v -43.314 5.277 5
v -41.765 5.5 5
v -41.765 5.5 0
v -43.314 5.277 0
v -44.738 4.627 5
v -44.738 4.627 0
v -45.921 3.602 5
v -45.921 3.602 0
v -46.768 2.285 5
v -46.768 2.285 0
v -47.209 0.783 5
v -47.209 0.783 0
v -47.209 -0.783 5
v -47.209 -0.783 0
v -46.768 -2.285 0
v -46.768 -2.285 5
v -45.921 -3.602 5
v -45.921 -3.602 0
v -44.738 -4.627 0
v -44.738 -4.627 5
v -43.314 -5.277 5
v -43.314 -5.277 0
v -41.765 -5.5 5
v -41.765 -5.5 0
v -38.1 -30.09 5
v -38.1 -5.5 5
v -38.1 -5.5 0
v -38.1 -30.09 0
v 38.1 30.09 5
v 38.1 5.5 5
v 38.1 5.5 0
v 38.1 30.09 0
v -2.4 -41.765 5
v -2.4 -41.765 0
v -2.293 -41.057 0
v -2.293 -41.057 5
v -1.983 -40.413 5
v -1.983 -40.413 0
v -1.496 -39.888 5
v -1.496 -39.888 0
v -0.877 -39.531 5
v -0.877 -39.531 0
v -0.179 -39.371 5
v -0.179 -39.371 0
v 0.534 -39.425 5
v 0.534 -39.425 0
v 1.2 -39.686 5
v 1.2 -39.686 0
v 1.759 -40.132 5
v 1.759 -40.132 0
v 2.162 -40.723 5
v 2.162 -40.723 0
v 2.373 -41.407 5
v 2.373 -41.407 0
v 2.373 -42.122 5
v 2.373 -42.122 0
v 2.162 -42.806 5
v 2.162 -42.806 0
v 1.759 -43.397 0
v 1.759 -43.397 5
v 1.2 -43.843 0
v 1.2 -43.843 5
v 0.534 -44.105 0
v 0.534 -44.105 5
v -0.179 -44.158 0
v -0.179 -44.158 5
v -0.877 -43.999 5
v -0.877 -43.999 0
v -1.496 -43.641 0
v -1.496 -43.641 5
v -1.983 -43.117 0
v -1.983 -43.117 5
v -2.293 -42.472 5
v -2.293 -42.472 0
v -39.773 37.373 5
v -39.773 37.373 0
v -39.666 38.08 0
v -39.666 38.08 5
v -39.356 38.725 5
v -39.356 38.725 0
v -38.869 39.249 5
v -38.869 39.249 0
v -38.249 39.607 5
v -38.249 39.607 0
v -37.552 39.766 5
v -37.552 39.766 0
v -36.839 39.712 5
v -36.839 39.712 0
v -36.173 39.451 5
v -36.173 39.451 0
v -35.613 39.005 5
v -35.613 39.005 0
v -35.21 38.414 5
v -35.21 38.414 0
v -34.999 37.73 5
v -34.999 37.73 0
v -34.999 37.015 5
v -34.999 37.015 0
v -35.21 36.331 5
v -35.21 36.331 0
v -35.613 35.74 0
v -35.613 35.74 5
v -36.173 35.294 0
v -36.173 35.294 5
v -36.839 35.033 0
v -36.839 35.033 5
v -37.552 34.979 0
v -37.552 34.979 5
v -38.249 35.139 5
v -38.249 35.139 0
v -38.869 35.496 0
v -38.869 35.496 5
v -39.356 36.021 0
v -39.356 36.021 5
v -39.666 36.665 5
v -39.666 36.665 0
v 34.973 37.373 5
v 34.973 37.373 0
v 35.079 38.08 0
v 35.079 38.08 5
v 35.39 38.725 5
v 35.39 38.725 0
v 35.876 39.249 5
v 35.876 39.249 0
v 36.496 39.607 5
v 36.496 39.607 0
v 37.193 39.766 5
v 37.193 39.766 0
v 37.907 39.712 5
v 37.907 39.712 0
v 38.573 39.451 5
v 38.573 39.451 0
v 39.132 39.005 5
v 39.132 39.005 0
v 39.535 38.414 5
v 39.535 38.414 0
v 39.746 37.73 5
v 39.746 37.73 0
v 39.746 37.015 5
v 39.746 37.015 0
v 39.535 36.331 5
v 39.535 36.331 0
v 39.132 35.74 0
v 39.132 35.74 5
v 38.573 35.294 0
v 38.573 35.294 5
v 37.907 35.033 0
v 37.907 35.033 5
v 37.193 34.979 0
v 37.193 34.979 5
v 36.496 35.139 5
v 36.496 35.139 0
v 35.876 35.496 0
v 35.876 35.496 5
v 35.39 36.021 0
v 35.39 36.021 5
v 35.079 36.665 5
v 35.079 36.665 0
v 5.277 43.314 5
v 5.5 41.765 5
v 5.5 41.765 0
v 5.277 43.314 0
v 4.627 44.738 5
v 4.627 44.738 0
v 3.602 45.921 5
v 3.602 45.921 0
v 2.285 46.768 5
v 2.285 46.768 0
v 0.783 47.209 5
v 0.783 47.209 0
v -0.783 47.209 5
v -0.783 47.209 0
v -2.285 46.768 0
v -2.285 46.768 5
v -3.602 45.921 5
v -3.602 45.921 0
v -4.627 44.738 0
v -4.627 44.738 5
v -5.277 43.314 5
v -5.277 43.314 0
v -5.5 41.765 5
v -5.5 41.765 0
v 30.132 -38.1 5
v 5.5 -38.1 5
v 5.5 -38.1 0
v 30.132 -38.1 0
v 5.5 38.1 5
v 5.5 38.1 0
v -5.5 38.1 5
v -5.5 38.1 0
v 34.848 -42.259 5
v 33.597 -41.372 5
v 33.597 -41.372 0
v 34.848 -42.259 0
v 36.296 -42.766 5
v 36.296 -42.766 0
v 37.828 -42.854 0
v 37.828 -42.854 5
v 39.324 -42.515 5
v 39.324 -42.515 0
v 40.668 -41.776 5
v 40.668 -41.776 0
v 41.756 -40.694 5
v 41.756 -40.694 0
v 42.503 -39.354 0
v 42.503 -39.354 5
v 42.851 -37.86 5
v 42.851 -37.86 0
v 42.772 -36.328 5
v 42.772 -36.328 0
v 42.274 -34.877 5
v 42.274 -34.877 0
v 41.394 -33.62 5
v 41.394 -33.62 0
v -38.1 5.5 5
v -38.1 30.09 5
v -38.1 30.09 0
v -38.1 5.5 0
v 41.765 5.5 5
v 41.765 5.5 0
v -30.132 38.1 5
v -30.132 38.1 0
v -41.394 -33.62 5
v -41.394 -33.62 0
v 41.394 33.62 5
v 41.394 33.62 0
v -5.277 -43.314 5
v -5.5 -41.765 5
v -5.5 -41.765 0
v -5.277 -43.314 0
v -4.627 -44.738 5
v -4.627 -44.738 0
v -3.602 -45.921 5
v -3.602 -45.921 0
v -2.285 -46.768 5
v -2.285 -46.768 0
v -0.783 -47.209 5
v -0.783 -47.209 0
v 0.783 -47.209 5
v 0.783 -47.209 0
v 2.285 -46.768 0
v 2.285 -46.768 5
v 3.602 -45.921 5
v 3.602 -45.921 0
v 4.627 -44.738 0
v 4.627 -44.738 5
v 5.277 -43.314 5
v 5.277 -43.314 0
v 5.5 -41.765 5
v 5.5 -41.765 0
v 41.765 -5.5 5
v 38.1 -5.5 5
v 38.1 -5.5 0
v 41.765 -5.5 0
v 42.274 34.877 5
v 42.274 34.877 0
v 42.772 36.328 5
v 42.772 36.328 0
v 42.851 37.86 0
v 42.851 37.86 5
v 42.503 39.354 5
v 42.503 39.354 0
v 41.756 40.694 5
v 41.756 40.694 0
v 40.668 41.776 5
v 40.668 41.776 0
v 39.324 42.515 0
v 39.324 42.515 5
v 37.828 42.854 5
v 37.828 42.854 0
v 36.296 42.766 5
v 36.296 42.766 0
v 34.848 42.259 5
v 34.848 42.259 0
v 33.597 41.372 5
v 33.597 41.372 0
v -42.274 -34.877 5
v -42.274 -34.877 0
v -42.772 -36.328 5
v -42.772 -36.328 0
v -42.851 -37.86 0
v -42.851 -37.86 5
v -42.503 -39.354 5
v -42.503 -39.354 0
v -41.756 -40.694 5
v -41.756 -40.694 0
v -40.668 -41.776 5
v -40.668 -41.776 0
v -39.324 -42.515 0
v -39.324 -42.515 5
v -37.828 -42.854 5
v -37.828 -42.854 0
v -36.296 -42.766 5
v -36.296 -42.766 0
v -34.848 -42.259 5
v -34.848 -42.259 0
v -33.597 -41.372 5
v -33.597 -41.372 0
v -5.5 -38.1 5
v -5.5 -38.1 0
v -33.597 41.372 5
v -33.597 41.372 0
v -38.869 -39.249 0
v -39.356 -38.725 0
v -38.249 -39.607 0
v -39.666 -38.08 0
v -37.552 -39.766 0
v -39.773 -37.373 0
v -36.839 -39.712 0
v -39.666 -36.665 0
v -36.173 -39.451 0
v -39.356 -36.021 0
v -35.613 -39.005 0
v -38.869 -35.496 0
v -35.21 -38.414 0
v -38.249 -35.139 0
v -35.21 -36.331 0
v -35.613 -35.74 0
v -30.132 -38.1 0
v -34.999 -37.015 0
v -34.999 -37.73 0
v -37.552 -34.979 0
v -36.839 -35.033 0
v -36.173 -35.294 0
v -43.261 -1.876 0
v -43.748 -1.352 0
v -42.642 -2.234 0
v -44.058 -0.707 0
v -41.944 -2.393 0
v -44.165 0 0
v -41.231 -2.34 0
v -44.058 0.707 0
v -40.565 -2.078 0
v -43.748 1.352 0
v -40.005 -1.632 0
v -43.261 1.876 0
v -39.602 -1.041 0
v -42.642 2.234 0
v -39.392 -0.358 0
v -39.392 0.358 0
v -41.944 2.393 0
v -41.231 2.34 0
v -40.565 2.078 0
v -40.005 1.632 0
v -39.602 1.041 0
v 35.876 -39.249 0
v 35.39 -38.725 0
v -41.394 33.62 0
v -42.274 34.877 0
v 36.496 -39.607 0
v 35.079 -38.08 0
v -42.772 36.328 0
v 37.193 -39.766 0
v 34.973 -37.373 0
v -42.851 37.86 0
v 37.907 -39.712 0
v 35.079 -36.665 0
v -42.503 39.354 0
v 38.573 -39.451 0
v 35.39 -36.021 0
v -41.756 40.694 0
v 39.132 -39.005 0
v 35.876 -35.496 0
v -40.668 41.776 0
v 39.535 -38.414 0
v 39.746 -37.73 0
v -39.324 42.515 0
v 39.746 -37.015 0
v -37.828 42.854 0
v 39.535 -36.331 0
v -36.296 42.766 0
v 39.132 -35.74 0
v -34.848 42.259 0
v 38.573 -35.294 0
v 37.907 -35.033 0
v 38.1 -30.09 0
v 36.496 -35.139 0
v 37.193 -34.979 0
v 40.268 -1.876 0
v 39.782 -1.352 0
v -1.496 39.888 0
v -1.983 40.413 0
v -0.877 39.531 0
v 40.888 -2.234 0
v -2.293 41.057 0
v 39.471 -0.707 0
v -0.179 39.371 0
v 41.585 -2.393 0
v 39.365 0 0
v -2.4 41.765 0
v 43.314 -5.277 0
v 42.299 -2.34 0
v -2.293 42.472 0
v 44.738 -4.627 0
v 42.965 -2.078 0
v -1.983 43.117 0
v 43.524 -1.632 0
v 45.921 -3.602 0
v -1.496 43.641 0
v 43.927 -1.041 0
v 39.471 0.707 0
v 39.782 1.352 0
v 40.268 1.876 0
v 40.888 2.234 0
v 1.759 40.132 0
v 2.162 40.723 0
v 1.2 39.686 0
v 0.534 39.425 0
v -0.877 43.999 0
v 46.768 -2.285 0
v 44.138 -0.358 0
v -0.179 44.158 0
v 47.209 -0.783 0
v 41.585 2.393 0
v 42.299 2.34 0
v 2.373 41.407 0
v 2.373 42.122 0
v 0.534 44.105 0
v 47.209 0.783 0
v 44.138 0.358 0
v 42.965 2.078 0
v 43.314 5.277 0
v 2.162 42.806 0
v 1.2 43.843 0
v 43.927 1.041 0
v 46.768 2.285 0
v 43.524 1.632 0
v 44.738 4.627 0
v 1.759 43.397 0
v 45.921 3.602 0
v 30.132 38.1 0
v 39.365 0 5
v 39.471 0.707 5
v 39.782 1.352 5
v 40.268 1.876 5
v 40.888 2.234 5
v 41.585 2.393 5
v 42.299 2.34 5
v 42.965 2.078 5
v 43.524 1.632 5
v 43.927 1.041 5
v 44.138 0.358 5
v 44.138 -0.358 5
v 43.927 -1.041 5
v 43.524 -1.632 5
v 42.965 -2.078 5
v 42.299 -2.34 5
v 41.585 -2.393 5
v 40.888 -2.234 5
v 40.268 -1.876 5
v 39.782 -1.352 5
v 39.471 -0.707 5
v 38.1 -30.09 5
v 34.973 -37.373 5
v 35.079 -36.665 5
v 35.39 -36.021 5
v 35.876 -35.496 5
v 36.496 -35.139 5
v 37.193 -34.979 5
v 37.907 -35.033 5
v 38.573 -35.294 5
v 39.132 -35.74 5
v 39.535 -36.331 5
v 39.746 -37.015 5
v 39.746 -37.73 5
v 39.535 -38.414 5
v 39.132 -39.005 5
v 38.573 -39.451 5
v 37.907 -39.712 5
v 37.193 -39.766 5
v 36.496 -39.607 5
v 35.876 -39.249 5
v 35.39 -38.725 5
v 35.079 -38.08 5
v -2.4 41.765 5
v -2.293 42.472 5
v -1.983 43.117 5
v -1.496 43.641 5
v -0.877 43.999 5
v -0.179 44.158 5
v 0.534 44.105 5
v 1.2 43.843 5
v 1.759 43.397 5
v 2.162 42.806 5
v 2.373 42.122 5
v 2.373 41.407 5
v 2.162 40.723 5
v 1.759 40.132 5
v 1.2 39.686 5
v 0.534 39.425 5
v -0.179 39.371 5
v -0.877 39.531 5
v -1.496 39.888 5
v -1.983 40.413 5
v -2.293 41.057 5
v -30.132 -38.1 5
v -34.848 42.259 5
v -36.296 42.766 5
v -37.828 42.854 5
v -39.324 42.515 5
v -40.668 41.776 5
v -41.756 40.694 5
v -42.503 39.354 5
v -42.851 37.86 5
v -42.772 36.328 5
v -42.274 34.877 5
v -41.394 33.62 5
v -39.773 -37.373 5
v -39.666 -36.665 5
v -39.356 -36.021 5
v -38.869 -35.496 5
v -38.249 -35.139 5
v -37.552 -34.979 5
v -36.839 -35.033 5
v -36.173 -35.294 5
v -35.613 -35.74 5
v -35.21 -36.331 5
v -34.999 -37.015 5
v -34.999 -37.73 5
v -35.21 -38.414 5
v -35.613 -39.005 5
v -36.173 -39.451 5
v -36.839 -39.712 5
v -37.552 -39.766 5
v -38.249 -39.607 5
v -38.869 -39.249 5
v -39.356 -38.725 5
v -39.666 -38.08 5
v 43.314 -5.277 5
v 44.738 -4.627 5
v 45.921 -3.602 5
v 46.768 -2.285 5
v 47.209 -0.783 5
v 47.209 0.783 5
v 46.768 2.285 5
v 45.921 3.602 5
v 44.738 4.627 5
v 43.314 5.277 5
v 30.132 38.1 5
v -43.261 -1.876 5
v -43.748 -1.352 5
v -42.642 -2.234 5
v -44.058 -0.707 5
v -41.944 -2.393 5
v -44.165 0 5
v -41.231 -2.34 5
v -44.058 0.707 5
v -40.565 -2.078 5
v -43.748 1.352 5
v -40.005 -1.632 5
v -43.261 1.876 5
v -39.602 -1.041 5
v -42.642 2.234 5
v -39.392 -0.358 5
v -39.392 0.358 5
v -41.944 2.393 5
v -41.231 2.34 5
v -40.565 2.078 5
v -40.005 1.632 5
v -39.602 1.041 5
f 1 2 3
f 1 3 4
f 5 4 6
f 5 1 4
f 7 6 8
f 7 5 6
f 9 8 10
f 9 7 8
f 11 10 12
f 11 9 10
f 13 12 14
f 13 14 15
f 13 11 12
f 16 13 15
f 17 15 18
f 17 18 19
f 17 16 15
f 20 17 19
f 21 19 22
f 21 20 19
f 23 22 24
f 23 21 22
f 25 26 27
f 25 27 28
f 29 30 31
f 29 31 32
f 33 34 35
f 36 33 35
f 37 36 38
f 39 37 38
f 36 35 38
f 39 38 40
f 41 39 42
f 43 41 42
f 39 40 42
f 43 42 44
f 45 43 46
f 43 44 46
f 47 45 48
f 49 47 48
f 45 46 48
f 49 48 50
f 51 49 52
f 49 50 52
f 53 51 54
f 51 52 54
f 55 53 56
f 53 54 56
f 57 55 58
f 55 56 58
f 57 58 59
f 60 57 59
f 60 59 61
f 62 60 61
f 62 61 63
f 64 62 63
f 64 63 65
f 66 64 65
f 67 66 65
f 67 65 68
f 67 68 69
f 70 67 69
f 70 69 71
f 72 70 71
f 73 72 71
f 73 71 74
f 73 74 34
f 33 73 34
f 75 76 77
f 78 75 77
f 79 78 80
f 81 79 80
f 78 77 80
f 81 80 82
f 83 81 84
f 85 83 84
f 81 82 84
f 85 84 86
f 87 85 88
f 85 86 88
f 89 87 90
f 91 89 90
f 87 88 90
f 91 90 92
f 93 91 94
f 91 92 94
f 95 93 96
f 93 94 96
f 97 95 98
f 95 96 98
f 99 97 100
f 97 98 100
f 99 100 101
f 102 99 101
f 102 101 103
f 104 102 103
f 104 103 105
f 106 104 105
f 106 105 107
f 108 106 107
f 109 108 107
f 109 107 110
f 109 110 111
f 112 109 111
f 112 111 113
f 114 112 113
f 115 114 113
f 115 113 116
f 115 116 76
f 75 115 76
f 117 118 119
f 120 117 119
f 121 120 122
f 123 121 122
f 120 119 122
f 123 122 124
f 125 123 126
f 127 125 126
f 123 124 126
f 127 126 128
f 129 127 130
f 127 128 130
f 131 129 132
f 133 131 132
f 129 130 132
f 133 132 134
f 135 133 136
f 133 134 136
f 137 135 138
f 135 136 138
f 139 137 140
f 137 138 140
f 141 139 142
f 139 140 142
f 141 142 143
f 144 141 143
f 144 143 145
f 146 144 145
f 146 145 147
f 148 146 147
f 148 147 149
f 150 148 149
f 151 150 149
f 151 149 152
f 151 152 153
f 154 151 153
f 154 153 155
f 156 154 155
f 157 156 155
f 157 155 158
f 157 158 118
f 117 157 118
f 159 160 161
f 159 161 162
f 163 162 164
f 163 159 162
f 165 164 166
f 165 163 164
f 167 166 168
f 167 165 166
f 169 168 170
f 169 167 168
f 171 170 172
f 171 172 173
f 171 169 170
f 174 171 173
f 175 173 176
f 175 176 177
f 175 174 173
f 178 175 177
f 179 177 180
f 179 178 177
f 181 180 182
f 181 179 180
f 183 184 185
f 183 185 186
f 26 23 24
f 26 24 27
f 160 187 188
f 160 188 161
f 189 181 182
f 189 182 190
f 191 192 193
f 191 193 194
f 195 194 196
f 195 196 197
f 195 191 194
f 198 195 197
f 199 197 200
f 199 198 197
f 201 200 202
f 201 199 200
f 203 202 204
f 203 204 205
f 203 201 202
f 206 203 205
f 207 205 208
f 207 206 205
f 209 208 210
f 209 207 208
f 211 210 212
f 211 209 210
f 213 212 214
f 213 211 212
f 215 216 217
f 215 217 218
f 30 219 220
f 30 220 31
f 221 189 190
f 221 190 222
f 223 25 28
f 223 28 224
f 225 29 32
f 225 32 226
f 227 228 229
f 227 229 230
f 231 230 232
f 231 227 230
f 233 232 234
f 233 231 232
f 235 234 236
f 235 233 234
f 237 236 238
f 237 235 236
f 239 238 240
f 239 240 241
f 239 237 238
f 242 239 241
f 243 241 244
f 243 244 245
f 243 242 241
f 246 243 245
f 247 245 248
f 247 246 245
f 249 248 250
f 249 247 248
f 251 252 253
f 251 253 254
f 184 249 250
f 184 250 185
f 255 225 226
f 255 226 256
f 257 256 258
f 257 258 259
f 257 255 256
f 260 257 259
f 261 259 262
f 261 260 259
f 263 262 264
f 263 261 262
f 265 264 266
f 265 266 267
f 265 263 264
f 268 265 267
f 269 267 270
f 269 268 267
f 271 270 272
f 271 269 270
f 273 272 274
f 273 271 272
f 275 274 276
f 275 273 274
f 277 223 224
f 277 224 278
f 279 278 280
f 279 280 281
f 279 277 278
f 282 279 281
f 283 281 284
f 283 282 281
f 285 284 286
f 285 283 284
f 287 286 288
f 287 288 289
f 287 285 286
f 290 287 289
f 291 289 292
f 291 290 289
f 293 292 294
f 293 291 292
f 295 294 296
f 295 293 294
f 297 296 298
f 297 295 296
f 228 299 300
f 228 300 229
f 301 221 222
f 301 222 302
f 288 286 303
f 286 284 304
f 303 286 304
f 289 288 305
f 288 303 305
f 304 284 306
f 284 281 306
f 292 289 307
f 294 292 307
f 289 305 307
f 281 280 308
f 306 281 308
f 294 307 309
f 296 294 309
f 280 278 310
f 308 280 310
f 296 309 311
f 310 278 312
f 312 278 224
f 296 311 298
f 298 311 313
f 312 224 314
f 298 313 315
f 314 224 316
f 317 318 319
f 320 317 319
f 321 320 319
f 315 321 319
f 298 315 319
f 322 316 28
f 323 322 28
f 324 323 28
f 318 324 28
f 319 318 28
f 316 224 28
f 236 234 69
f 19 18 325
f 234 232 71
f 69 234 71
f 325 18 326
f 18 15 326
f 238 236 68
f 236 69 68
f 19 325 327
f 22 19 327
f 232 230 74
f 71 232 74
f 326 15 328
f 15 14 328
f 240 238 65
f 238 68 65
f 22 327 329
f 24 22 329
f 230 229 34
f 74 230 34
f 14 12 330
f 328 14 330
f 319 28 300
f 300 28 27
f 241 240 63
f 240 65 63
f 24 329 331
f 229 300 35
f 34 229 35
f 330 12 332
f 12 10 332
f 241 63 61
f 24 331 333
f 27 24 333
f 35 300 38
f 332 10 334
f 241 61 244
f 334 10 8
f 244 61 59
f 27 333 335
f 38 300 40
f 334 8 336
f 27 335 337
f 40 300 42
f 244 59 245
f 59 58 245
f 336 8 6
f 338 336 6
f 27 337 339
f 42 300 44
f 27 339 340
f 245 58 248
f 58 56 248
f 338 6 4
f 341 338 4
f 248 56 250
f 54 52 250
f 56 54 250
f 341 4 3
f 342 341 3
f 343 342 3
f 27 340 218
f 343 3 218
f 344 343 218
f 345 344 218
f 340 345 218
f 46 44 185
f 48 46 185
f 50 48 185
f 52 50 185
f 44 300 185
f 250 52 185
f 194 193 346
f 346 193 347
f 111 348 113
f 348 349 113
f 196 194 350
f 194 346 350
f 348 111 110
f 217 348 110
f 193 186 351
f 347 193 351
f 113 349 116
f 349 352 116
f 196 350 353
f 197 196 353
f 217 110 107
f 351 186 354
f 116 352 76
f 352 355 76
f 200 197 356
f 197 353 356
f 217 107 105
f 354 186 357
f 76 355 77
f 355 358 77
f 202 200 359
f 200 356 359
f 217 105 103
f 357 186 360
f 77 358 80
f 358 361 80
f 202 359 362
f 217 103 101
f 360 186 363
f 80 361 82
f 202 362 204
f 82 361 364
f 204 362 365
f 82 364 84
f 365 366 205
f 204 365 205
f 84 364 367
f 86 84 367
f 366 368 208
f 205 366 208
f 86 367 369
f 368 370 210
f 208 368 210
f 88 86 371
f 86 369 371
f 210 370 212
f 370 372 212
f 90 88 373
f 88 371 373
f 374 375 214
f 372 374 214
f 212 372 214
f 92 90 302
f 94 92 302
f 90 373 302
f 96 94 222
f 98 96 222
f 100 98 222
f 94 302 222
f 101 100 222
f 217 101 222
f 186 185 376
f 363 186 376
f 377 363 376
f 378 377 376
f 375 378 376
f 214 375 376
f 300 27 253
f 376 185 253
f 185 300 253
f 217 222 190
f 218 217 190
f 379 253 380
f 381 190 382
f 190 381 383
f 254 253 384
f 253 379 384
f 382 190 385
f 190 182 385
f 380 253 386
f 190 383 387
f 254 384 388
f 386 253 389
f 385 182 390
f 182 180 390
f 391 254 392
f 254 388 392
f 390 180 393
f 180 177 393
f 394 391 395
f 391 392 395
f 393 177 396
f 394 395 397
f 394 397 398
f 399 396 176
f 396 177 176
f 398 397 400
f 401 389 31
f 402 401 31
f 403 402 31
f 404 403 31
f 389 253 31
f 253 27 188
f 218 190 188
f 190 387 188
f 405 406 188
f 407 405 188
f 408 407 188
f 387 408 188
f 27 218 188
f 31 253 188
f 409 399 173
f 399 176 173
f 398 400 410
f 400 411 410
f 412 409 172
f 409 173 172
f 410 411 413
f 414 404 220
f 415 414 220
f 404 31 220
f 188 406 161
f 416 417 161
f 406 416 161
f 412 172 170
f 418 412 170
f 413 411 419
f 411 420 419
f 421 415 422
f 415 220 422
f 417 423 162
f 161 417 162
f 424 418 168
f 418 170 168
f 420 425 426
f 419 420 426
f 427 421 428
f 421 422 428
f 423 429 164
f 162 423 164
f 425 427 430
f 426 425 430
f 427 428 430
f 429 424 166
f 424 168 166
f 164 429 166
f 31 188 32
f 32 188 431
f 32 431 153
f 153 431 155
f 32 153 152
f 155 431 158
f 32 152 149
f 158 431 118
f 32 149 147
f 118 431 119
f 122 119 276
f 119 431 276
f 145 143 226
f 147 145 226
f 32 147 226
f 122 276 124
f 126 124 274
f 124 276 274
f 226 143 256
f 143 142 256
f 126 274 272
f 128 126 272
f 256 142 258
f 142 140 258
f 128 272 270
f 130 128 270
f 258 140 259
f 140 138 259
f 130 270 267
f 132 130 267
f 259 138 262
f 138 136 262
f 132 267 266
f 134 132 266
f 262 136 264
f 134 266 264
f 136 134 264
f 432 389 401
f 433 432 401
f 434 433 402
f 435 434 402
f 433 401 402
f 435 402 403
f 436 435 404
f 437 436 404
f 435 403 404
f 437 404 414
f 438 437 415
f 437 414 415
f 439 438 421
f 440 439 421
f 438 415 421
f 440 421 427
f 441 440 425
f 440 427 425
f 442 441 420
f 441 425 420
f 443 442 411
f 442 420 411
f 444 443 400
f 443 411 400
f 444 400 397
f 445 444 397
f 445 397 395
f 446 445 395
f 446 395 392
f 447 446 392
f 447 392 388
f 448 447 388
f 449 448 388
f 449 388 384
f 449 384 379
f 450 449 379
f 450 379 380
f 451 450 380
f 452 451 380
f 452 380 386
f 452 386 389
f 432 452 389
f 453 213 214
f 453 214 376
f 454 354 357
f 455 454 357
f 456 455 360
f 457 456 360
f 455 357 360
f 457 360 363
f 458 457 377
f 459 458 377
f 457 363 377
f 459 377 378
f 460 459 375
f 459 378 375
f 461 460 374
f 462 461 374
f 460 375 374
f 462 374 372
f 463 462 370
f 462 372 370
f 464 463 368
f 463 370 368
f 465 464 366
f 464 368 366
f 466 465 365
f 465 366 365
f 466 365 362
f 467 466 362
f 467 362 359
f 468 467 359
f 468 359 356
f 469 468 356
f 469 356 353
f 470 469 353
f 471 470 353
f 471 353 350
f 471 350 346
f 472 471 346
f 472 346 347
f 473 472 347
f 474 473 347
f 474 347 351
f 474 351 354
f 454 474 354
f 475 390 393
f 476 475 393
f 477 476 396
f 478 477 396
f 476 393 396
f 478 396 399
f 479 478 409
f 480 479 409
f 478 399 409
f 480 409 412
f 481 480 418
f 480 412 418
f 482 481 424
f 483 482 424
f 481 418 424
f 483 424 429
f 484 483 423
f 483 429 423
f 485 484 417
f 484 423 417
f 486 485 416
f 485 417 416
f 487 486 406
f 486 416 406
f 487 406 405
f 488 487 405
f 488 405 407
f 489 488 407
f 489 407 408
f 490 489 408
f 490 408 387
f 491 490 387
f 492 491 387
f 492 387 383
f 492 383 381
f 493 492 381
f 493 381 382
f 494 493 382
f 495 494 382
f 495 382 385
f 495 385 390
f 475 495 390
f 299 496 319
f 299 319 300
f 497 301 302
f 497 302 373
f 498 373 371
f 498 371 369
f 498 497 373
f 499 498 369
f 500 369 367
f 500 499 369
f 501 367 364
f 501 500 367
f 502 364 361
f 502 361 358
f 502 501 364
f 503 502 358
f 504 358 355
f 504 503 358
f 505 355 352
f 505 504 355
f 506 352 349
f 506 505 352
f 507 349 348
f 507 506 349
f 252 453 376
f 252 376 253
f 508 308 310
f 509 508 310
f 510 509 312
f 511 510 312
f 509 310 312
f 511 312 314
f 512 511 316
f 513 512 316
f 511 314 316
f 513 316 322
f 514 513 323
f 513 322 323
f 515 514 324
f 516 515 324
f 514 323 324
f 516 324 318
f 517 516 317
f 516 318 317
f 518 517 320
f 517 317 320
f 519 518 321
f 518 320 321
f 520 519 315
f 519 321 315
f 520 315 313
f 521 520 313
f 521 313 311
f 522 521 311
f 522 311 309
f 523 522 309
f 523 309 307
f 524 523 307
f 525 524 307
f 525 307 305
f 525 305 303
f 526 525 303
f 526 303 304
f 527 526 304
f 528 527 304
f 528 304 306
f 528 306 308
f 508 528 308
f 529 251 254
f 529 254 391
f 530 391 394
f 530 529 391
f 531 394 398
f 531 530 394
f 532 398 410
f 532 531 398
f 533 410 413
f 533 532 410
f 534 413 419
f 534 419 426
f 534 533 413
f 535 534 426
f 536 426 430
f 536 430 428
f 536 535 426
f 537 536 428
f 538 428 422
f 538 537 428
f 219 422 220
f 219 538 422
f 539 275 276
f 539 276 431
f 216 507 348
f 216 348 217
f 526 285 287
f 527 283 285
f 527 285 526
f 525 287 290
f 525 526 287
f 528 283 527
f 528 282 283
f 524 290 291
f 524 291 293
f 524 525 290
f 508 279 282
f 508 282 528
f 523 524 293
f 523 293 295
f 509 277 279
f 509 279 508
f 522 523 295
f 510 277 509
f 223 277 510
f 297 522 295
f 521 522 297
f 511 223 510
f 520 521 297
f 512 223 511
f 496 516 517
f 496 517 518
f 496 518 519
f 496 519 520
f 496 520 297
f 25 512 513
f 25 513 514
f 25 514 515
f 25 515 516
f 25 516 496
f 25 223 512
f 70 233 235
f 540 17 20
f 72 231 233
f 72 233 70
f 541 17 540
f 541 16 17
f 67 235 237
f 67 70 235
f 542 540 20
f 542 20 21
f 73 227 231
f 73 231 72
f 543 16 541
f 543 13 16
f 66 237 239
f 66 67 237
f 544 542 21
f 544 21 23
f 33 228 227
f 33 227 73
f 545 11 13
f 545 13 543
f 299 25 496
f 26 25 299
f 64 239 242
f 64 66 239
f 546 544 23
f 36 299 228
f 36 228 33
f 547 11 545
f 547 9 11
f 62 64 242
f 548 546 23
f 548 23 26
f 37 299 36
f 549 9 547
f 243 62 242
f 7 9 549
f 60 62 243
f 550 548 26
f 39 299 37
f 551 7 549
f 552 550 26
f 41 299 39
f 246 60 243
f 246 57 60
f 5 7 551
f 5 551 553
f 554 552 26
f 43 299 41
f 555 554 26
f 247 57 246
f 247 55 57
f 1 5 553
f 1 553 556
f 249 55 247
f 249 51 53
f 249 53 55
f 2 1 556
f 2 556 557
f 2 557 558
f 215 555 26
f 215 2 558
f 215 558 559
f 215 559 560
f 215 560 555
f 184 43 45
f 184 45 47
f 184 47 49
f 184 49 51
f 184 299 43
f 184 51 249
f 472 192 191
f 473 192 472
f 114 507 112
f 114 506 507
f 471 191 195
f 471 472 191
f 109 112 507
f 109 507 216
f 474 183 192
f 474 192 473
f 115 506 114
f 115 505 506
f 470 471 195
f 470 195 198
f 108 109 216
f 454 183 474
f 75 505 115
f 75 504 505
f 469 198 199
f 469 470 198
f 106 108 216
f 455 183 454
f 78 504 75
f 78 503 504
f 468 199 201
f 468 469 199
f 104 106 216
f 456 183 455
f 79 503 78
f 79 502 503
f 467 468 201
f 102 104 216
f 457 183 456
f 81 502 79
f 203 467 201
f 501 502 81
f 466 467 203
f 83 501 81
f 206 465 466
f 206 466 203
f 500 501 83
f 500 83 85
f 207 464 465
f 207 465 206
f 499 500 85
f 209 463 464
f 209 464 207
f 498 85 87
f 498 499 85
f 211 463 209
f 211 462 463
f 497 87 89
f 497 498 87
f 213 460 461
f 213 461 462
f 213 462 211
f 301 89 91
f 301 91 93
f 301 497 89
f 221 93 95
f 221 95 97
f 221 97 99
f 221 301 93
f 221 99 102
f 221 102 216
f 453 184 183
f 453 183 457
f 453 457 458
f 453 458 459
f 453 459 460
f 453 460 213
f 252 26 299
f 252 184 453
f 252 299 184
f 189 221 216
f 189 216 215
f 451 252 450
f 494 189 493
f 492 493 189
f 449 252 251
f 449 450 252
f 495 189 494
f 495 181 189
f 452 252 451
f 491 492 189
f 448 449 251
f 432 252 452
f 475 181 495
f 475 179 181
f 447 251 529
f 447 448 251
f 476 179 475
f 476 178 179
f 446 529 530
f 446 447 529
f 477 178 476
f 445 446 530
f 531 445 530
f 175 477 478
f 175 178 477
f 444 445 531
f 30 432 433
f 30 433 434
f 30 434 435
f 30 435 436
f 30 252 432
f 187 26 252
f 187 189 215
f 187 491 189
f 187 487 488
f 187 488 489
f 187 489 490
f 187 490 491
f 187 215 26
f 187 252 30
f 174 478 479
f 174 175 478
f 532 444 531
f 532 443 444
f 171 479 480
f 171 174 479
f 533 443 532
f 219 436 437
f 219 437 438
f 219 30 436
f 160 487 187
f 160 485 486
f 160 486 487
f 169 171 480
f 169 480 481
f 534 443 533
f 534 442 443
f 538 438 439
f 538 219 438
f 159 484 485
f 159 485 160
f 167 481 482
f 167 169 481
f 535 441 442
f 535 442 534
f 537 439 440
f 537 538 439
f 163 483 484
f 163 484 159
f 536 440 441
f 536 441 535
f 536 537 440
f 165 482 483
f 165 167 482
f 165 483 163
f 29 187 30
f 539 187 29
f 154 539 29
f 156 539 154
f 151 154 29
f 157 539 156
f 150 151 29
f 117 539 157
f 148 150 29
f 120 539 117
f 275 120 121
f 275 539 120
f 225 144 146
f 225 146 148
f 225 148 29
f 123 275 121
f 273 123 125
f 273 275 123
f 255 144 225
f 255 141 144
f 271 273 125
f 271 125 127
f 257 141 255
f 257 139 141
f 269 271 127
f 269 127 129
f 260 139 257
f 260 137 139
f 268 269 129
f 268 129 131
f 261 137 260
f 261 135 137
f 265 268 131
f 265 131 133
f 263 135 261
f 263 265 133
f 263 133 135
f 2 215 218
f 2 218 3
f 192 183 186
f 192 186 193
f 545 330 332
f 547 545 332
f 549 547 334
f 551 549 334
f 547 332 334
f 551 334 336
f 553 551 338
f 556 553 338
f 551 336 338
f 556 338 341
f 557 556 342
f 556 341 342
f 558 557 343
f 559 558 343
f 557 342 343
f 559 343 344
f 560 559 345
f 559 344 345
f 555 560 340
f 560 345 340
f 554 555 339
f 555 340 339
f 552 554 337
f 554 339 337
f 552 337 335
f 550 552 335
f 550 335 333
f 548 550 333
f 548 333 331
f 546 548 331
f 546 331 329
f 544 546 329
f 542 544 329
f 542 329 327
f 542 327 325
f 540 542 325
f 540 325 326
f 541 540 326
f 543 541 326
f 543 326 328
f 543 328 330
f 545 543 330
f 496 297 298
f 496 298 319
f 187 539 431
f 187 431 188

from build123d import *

# Parameters (mm, degrees)
SKETCH1_W            = 76.2
SKETCH1_H            = 76.2
BOSS_EXTRUDE1_DEPTH  = 5
FILLET1_R            = 5.334
BOSS_EXTRUDE2_DEPTH  = 5
M4_CLEARANCE_HOLE1_D = 4.8


with BuildPart() as part:
    # Sketch1 → Boss-Extrude1 (new body)
    with BuildSketch(Plane.XY):
        Rectangle(SKETCH1_W, SKETCH1_H)
    extrude(amount=BOSS_EXTRUDE1_DEPTH)

    # Fillet1
    fillet1_edges = [part.edges().sort_by_distance(p)[0] for p in [
        (38.1, -38.1, 2.5),
        (-38.1, -38.1, 2.5),
        (-38.1, 38.1, 2.5),
        (38.1, 38.1, 2.5),
    ]]
    fillet(fillet1_edges, radius=FILLET1_R)

    # Sketch2 → Boss-Extrude2 (add)
    with BuildSketch(Plane.XY.offset(5)):
        with BuildLine():
            Line((-38.1, -30.090129163), (-41.393974839, -33.620461233))
            ThreePointArc((-41.393974839, -33.620461233), (-41.250124596, -41.273219147), (-33.596647392, -41.371622715))
            Line((-33.596647392, -41.371622715), (-30.131751686, -38.1))
            Line((-30.131751686, -38.1), (-5.5, -38.1))
            Line((-5.5, -38.1), (-5.5, -41.7647))
            ThreePointArc((-5.5, -41.7647), (0, -47.2647), (5.5, -41.7647))
            Line((5.5, -41.7647), (5.5, -38.1))
            Line((5.5, -38.1), (30.131751686, -38.1))
            Line((30.131751686, -38.1), (33.596647392, -41.371622715))
            ThreePointArc((33.596647392, -41.371622715), (41.250124596, -41.273219147), (41.393974839, -33.620461233))
            Line((41.393974839, -33.620461233), (38.1, -30.090129163))
            Line((38.1, -30.090129163), (38.1, -5.5))
            Line((38.1, -5.5), (41.7647, -5.5))
            ThreePointArc((41.7647, -5.5), (47.2647, 0), (41.7647, 5.5))
            Line((41.7647, 5.5), (38.1, 5.5))
            Line((38.1, 5.5), (38.1, 30.090129163))
            Line((38.1, 30.090129163), (41.393974839, 33.620461233))
            ThreePointArc((41.393974839, 33.620461233), (41.250124596, 41.273219147), (33.596647392, 41.371622715))
            Line((33.596647392, 41.371622715), (30.131751686, 38.1))
            Line((30.131751686, 38.1), (5.5, 38.1))
            Line((5.5, 38.1), (5.5, 41.7647))
            ThreePointArc((5.5, 41.7647), (0, 47.2647), (-5.5, 41.7647))
            Line((-5.5, 41.7647), (-5.5, 38.1))
            Line((-5.5, 38.1), (-30.131751686, 38.1))
            Line((-30.131751686, 38.1), (-33.596647392, 41.371622715))
            ThreePointArc((-33.596647392, 41.371622715), (-41.250124596, 41.273219147), (-41.393974839, 33.620461233))
            Line((-41.393974839, 33.620461233), (-38.1, 30.090129163))
            Line((-38.1, 30.090129163), (-38.1, 5.5))
            Line((-38.1, 5.5), (-41.7647, 5.5))
            ThreePointArc((-41.7647, 5.5), (-47.2647, 0), (-41.7647, -5.5))
            Line((-41.7647, -5.5), (-38.1, -5.5))
            Line((-38.1, -5.5), (-38.1, -30.090129163))
        make_face()
    extrude(amount=-BOSS_EXTRUDE2_DEPTH)

    # M4 Clearance Hole1 (through all)
    with Locations(Plane.XY.offset(5)):
        with Locations((0, -41.7647), (37.372601718, -37.372601718), (-37.372601718, -37.372601718), (-41.7647, 0), (41.7647, 0), (37.372601718, 37.372601718), (0, 41.7647), (-37.372601718, 37.372601718)):
            Hole(M4_CLEARANCE_HOLE1_D / 2)


solid = part.part
